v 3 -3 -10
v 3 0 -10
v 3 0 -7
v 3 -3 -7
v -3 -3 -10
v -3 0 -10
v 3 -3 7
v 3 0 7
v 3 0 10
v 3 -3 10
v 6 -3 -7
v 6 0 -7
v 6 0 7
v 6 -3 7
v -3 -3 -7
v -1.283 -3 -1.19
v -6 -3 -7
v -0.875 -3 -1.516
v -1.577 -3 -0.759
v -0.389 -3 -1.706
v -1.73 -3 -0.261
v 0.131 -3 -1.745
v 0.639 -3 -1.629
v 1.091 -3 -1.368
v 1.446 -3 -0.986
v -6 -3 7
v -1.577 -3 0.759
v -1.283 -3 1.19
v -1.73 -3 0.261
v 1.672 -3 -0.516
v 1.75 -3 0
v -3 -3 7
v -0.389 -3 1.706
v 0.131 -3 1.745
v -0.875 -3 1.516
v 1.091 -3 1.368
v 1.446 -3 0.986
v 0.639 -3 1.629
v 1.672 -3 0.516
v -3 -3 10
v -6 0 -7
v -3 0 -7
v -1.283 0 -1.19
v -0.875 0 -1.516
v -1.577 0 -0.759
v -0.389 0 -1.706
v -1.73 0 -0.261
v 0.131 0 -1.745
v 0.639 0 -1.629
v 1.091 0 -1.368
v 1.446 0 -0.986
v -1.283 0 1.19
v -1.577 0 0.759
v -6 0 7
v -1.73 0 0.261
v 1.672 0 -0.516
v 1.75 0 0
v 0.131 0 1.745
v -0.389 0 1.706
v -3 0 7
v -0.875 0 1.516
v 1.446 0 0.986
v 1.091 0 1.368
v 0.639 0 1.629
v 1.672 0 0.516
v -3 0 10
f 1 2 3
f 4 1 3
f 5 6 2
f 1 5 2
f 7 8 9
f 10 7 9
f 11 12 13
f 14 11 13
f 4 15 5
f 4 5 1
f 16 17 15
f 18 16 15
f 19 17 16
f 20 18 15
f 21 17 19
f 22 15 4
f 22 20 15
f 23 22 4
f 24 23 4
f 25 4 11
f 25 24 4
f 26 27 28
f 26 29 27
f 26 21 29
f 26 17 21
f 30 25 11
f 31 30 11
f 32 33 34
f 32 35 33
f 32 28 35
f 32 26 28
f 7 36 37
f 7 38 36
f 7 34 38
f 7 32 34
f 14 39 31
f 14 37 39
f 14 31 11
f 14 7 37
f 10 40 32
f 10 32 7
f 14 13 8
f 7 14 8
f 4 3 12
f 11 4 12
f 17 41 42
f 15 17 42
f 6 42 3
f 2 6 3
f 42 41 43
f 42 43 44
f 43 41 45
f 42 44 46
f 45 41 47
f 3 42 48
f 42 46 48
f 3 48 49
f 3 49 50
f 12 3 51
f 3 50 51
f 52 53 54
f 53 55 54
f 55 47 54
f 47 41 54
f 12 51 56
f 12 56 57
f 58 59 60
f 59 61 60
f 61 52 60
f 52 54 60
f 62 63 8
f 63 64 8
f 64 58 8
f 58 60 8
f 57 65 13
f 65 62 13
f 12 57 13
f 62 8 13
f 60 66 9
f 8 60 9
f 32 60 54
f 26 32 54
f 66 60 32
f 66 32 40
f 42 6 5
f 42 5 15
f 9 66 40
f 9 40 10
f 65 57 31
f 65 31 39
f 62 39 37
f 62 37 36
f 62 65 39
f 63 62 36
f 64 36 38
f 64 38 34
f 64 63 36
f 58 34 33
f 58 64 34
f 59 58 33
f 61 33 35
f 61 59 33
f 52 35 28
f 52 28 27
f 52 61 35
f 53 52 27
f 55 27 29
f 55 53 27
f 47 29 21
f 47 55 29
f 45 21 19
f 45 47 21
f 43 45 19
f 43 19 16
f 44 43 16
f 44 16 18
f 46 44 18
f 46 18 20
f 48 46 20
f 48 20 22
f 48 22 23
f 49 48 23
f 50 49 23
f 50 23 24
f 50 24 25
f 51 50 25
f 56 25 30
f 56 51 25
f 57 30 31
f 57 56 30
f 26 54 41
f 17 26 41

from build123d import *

# Parameters (mm, degrees)
F0_R     = 1.75
F0_W     = 6
F0_H     = 3
F1_DEPTH = 3


with BuildPart() as f1:
    # F0 (on Front) → F1 (new body)
    with BuildSketch(Plane.XZ):
        Polygon((6, -7), (6, 7), (3, 7), (-3, 7), (-6, 7), (-6, -7), (-3, -7), (3, -7), align=None)
        Circle(F0_R, mode=Mode.SUBTRACT)
        with Locations((0, 8.5)):
            Rectangle(F0_W, F0_H)
        with Locations((0, -8.5)):
            Rectangle(F0_W, F0_H)
    extrude(amount=F1_DEPTH)


solid = f1.part
